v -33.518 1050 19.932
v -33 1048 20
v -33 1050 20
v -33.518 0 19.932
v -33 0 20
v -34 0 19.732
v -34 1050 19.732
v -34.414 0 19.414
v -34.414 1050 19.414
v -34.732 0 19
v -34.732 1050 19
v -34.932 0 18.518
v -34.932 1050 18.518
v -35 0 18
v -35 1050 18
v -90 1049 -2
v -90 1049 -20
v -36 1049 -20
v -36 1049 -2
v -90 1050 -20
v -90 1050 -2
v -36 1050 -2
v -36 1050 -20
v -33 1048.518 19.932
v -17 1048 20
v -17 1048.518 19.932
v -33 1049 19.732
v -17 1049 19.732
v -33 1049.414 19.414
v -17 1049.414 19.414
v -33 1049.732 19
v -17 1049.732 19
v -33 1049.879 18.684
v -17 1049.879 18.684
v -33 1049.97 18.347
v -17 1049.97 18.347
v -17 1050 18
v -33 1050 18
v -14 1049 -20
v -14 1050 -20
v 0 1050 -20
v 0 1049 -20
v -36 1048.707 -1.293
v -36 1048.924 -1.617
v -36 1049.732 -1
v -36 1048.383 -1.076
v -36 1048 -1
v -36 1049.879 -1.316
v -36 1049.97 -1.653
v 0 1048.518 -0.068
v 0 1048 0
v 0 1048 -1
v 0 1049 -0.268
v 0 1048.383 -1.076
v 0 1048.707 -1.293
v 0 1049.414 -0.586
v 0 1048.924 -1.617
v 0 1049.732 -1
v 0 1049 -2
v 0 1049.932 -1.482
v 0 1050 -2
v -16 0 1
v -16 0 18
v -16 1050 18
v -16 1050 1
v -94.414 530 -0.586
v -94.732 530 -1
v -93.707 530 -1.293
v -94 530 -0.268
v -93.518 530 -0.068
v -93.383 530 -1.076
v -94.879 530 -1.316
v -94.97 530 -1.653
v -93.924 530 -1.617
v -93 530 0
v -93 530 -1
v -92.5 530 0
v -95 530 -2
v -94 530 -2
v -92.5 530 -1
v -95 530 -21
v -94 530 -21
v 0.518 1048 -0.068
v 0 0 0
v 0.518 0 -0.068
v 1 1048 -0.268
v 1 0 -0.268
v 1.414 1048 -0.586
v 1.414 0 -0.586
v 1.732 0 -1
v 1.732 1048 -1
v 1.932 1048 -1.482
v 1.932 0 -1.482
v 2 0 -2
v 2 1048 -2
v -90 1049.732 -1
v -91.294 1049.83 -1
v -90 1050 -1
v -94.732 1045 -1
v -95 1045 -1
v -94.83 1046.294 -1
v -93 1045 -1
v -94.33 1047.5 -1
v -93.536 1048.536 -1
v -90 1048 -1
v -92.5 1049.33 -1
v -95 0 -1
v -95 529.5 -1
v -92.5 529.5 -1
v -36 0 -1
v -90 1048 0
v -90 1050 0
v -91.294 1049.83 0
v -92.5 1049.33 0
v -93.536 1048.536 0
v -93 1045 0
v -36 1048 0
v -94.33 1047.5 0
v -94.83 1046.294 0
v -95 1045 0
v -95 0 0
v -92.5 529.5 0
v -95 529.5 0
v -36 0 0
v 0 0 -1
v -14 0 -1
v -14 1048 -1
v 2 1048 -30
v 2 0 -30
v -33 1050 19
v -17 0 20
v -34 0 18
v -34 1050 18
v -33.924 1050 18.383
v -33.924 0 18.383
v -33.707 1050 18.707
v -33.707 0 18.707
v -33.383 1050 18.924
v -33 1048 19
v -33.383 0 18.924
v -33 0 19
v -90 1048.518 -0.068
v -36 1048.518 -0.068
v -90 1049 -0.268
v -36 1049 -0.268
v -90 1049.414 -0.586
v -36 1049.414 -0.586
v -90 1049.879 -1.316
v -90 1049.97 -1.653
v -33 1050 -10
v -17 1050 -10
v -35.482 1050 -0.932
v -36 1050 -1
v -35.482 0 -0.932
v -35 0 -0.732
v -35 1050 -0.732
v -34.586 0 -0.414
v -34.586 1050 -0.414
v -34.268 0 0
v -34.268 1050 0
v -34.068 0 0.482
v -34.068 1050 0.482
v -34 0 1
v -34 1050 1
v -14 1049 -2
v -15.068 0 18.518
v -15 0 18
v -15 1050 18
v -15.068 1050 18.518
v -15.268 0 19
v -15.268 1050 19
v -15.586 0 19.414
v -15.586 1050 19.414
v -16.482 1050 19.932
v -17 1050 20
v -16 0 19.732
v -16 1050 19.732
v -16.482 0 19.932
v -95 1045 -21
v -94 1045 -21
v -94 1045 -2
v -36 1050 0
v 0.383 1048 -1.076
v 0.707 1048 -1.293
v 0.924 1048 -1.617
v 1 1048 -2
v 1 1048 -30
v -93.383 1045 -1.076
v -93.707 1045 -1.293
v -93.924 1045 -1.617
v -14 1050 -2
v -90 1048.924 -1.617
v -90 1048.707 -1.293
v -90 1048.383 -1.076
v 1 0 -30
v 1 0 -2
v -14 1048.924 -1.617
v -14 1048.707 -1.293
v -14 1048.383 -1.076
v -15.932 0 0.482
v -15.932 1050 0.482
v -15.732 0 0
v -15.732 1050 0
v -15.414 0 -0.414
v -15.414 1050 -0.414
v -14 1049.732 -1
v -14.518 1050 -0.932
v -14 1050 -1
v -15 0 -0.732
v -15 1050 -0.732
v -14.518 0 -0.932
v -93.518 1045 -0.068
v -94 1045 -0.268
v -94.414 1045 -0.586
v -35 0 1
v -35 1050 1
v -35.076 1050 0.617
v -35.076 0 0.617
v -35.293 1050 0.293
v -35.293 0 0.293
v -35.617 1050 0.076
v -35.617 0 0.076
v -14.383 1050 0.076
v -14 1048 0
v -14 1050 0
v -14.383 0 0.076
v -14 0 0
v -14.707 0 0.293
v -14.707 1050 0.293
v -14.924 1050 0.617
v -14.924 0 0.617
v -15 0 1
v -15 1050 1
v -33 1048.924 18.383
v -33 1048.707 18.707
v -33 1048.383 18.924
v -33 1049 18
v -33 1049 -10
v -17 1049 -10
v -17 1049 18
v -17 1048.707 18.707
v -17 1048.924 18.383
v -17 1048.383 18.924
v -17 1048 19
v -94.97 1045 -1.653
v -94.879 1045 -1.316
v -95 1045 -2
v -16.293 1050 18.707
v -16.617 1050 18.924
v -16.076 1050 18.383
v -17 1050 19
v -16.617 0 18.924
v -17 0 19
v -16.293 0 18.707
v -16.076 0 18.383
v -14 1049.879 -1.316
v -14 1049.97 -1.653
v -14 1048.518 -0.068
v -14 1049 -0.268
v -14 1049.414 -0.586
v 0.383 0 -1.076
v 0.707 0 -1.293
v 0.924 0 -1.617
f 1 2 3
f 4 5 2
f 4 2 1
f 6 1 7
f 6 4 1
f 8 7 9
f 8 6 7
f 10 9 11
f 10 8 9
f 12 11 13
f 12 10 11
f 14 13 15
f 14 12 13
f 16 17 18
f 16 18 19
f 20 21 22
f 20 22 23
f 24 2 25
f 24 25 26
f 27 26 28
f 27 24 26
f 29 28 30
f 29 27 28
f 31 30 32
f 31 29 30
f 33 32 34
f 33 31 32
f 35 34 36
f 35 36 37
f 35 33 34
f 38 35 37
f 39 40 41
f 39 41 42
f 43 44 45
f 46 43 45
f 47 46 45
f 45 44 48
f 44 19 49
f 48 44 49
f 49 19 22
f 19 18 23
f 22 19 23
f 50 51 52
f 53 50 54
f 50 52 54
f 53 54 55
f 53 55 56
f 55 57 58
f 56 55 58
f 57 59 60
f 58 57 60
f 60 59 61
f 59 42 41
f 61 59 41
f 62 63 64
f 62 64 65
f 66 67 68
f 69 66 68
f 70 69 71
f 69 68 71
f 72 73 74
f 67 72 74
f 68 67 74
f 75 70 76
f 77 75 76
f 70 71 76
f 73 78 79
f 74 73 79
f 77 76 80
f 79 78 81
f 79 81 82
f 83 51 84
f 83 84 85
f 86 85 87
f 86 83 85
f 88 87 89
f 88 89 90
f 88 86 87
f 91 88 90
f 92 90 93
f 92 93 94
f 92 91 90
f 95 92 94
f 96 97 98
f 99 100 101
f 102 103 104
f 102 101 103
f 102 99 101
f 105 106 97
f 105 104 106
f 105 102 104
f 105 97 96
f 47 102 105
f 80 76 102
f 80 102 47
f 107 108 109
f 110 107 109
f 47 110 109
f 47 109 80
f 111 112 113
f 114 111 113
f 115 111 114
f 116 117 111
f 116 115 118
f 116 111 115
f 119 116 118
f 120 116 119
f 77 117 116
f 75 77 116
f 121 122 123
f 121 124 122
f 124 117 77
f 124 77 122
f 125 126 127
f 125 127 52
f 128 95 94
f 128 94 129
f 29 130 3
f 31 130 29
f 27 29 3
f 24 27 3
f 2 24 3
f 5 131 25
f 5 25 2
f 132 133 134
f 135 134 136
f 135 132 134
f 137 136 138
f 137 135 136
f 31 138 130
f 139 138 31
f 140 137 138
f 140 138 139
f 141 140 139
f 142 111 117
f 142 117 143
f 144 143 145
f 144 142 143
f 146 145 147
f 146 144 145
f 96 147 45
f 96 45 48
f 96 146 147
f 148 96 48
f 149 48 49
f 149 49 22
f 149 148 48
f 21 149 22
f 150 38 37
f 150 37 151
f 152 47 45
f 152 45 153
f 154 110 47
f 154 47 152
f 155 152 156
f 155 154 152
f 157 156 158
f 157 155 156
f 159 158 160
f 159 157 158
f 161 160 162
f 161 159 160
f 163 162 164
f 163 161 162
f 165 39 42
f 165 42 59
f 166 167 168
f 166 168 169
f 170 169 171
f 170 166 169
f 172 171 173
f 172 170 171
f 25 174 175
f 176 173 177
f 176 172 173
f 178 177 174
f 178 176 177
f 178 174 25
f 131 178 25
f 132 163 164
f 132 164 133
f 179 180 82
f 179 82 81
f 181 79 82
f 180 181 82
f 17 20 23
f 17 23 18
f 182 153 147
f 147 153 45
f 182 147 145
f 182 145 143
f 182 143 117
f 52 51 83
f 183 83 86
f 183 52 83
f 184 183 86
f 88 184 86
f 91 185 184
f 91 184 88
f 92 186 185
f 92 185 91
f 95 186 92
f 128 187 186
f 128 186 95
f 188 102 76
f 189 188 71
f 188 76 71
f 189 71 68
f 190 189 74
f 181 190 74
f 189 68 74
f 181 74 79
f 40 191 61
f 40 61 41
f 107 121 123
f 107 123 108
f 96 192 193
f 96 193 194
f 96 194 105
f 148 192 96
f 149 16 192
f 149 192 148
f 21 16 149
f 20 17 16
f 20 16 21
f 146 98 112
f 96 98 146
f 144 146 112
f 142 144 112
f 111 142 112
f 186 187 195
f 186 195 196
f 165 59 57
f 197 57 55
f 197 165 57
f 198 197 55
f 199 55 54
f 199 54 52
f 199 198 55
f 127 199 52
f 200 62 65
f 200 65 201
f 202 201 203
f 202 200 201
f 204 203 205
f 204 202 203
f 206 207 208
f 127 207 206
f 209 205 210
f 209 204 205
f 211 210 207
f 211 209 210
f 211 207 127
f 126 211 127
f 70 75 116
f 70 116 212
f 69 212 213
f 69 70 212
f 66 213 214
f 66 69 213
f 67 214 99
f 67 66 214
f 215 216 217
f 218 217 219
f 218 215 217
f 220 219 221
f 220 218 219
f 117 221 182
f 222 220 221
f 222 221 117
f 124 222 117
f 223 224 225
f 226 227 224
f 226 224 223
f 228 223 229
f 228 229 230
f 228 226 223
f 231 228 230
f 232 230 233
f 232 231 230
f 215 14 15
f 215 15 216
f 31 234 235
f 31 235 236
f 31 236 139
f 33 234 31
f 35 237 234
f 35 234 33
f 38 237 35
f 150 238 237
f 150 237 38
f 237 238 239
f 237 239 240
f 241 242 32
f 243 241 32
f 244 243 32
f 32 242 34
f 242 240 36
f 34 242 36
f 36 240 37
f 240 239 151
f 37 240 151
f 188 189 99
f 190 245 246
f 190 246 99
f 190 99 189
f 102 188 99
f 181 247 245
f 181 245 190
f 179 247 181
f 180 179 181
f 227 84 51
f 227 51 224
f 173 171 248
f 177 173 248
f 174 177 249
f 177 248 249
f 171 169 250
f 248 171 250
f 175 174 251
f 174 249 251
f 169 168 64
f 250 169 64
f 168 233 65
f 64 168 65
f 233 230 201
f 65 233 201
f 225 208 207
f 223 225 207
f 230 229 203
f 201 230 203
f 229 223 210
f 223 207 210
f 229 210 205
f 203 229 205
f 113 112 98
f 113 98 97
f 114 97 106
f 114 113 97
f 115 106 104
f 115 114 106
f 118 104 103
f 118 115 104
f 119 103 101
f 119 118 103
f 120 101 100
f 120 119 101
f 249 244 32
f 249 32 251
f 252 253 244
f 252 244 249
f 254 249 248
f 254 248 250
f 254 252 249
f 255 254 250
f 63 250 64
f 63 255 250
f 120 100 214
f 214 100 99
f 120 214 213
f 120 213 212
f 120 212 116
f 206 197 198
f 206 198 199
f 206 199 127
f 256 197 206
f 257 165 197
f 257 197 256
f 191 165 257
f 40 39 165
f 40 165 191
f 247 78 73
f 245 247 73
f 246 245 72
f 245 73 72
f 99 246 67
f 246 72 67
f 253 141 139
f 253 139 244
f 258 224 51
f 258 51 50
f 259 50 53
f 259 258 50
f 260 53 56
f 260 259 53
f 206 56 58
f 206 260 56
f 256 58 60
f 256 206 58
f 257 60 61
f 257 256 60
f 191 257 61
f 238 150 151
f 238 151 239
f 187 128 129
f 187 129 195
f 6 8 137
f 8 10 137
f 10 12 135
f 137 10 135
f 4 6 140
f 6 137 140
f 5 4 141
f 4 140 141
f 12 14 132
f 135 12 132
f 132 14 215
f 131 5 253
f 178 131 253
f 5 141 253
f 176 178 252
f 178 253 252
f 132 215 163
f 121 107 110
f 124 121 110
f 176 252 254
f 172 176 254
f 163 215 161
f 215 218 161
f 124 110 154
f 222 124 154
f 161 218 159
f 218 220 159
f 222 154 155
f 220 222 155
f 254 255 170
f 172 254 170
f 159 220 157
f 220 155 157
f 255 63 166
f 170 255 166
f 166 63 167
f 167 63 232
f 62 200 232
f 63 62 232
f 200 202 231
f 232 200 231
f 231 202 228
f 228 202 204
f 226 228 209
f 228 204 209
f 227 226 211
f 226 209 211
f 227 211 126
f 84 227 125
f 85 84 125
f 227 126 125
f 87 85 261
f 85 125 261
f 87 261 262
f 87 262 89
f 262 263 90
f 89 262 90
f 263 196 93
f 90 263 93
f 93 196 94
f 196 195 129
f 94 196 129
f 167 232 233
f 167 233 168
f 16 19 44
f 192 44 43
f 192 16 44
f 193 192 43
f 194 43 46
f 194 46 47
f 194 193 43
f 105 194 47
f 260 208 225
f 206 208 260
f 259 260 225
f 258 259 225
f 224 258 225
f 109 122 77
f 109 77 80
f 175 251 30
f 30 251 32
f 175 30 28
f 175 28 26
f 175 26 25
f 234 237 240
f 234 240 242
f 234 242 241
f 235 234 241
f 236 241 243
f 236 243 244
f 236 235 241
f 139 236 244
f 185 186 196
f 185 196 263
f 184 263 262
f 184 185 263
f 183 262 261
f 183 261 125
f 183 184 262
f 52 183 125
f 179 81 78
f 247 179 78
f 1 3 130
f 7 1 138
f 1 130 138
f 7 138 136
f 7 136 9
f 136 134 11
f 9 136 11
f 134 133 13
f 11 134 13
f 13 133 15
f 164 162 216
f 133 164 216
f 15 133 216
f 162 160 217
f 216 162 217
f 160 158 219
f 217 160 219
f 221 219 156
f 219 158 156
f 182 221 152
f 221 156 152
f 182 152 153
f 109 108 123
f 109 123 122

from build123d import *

# Parameters (mm, degrees)
BASE_FLANGE1_DEPTH             = 1050
CUT_EXTRUDE1_REACH             = 1056.479
EDGE_FLANGE5_STRIP_W           = 16
EDGE_FLANGE5_STRIP_H           = 1
EDGE_FLANGE5_STRIP_CUT_DEPTH   = 54
EDGE_FLANGE5_STRIP_2_W         = 16
EDGE_FLANGE5_STRIP_2_H         = 1
EDGE_FLANGE5_STRIP_CUT_2_DEPTH = 14
EDGE_FLANGE5_DEPTH             = 54
EDGE_FLANGE5_BEND_DEPTH        = 14
EDGE_FLANGE7_DEPTH             = 1048
EDGE_FLANGE8_STRIP_W           = 6
EDGE_FLANGE8_STRIP_H           = 1
EDGE_FLANGE8_STRIP_CUT_DEPTH   = 16
EDGE_FLANGE8_DEPTH             = 16
EDGE_FLANGE9_START             = 529.5
EDGE_FLANGE9_DEPTH             = 515.5
EDGE_FLANGE9_2_DEPTH           = 0.5
EDGE_FLANGE9_START_2           = 530
EDGE_FLANGE9_3_DEPTH           = 515


# Read off the part's stored shape, not the designer's step: Edge-Flange9
# Sheet-metal steps are written as plain solids
with BuildPart() as part:
    # Sketch1 → Base-Flange1 (new body)
    with BuildSketch(Plane(origin=(0, 0, 0), x_dir=(1, 0, 0), z_dir=(0, 1, 0))):
        with BuildLine():
            Line((0, 0), (-14, 0))
            ThreePointArc((-14, 0), (-14.707106781, -0.292893219), (-15, -1))
            Line((-15, -1), (-15, -18))
            ThreePointArc((-15, -18), (-15.585786438, -19.414213562), (-17, -20))
            Line((-17, -20), (-33, -20))
            ThreePointArc((-33, -20), (-34.414213562, -19.414213562), (-35, -18))
            Line((-35, -18), (-35, -1))
            ThreePointArc((-35, -1), (-35.292893219, -0.292893219), (-36, 0))
            Line((-36, 0), (-95, 0))
            Line((-95, 0), (-95, 1))
            Line((-95, 1), (-36, 1))
            ThreePointArc((-36, 1), (-34.585786438, 0.414213562), (-34, -1))
            Line((-34, -1), (-34, -18))
            ThreePointArc((-34, -18), (-33.707106781, -18.707106781), (-33, -19))
            Line((-33, -19), (-17, -19))
            ThreePointArc((-17, -19), (-16.292893219, -18.707106781), (-16, -18))
            Line((-16, -18), (-16, -1))
            ThreePointArc((-16, -1), (-15.414213562, 0.414213562), (-14, 1))
            Line((-14, 1), (0, 1))
            Line((0, 1), (0, 0))
        make_face()
    extrude(amount=BASE_FLANGE1_DEPTH)

    # Sketch18 → Cut-Extrude1 (cut, up to next)
    with BuildSketch(Plane.XY, mode=Mode.PRIVATE) as cut_extrude1_sk1:
        with BuildLine():
            Line((-95, 1045), (-95, 1050))
            Line((-95, 1050), (-90, 1050))
            ThreePointArc((-90, 1050), (-93.535533906, 1048.535533906), (-95, 1045))
        make_face()
    cut_extrude1_tool1 = extrude(cut_extrude1_sk1.sketch, amount=-CUT_EXTRUDE1_REACH, mode=Mode.PRIVATE) & part.part
    add(cut_extrude1_tool1.solids().sort_by_distance((-93.88316, 1048.88316, 0))[0], mode=Mode.SUBTRACT)

    # Edge-Flange5 strip (across the edge) → Edge-Flange5 strip cut (cut)
    with BuildSketch(Plane(origin=(-90, 1050, -1), x_dir=(0, -1, 0), z_dir=(1, 0, 0))):
        with Locations((-6, -0.5)):
            Rectangle(EDGE_FLANGE5_STRIP_W, EDGE_FLANGE5_STRIP_H)
    extrude(amount=EDGE_FLANGE5_STRIP_CUT_DEPTH, mode=Mode.SUBTRACT)

    # Edge-Flange5 strip 2 (across the edge) → Edge-Flange5 strip cut 2 (cut)
    with BuildSketch(Plane(origin=(-14, 1050, -1), x_dir=(0, -1, 0), z_dir=(1, 0, 0))):
        with Locations((-6, -0.5)):
            Rectangle(EDGE_FLANGE5_STRIP_2_W, EDGE_FLANGE5_STRIP_2_H)
    extrude(amount=EDGE_FLANGE5_STRIP_CUT_2_DEPTH, mode=Mode.SUBTRACT)

    # Edge-Flange5 section (across the edge) → Edge-Flange5 (add)
    with BuildSketch(Plane(origin=(-90, 1050, -1), x_dir=(0, -1, 0), z_dir=(1, 0, 0))):
        with BuildLine():
            Line((0, 1), (0, 19))
            Line((0, 19), (1, 19))
            Line((1, 19), (1, 1))
            ThreePointArc((1, 1), (1.292893219, 0.292893219), (2, 0))
            Line((2, 0), (2, -1))
            ThreePointArc((2, -1), (0.585786438, -0.414213562), (0, 1))
        make_face()
    extrude(amount=EDGE_FLANGE5_DEPTH)

    # Edge-Flange5 section 2 (across the edge) → Edge-Flange5 bend (add)
    with BuildSketch(Plane(origin=(-14, 1050, -1), x_dir=(0, -1, 0), z_dir=(1, 0, 0))):
        with BuildLine():
            Line((0, 1), (0, 19))
            Line((0, 19), (1, 19))
            Line((1, 19), (1, 1))
            ThreePointArc((1, 1), (1.292893219, 0.292893219), (2, 0))
            Line((2, 0), (2, -1))
            ThreePointArc((2, -1), (0.585786438, -0.414213562), (0, 1))
        make_face()
    extrude(amount=EDGE_FLANGE5_BEND_DEPTH)

    # Edge-Flange7 section (across the edge) → Edge-Flange7 (add)
    with BuildSketch(Plane(origin=(1, 1048, -1), x_dir=(-1, 0, 0), z_dir=(0, -1, 0))):
        with BuildLine():
            Line((-1, 1), (-1, 29))
            Line((-1, 29), (0, 29))
            Line((0, 29), (0, 1))
            ThreePointArc((0, 1), (0.292893219, 0.292893219), (1, 0))
            Line((1, 0), (1, -1))
            ThreePointArc((1, -1), (-0.414213562, -0.414213562), (-1, 1))
        make_face()
    extrude(amount=EDGE_FLANGE7_DEPTH)

    # Edge-Flange8 strip (across the edge) → Edge-Flange8 strip cut (cut)
    with BuildSketch(Plane(origin=(-33, 1050, 19), x_dir=(0, -1, 0), z_dir=(1, 0, 0))):
        with Locations((-1, -0.5)):
            Rectangle(EDGE_FLANGE8_STRIP_W, EDGE_FLANGE8_STRIP_H)
    extrude(amount=EDGE_FLANGE8_STRIP_CUT_DEPTH, mode=Mode.SUBTRACT)

    # Edge-Flange8 section (across the edge) → Edge-Flange8 (add)
    with BuildSketch(Plane(origin=(-33, 1050, 19), x_dir=(0, -1, 0), z_dir=(1, 0, 0))):
        with BuildLine():
            Line((0, 1), (0, 29))
            Line((0, 29), (1, 29))
            Line((1, 29), (1, 1))
            ThreePointArc((1, 1), (1.292893219, 0.292893219), (2, 0))
            Line((2, 0), (2, -1))
            ThreePointArc((2, -1), (0.585786438, -0.414213562), (0, 1))
        make_face()
    extrude(amount=EDGE_FLANGE8_DEPTH)

    # Edge-Flange9 outline → Edge-Flange9 (cut)
    with BuildSketch(Plane(origin=(0, 0, 0), x_dir=(1, 0, 0), z_dir=(0, 1, 0)).offset(EDGE_FLANGE9_START)):
        with BuildLine():
            ThreePointArc((-93, 0), (-94, 0.267949193), (-94.732050807, 1))
            Line((-94.732050807, 1), (-95, 1))
            Line((-95, 1), (-95, 0))
            Line((-95, 0), (-93, 0))
        make_face()
    extrude(amount=EDGE_FLANGE9_DEPTH, mode=Mode.SUBTRACT)

    # Edge-Flange9 2 outline → Edge-Flange9 2 (cut)
    with BuildSketch(Plane(origin=(0, 0, 0), x_dir=(1, 0, 0), z_dir=(0, 1, 0)).offset(EDGE_FLANGE9_START)):
        with BuildLine():
            Line((-92.5, 1), (-94.732050807, 1))
            ThreePointArc((-94.732050807, 1), (-94, 0.267949193), (-93, 0))
            Line((-93, 0), (-92.5, 0))
            Line((-92.5, 0), (-92.5, 1))
        make_face()
    extrude(amount=EDGE_FLANGE9_2_DEPTH, mode=Mode.SUBTRACT)

    # Edge-Flange9 3 outline → Edge-Flange9 3 (add)
    with BuildSketch(Plane(origin=(0, 0, 0), x_dir=(1, 0, 0), z_dir=(0, 1, 0)).offset(EDGE_FLANGE9_START_2)):
        with BuildLine():
            Line((-95, 21), (-95, 2))
            ThreePointArc((-95, 2), (-94.931851652, 1.48236191), (-94.732050807, 1))
            Line((-94.732050807, 1), (-93, 1))
            ThreePointArc((-93, 1), (-93.707106781, 1.292893219), (-94, 2))
            Line((-94, 2), (-94, 21))
            Line((-94, 21), (-95, 21))
        make_face()
    extrude(amount=EDGE_FLANGE9_3_DEPTH)


solid = part.part
